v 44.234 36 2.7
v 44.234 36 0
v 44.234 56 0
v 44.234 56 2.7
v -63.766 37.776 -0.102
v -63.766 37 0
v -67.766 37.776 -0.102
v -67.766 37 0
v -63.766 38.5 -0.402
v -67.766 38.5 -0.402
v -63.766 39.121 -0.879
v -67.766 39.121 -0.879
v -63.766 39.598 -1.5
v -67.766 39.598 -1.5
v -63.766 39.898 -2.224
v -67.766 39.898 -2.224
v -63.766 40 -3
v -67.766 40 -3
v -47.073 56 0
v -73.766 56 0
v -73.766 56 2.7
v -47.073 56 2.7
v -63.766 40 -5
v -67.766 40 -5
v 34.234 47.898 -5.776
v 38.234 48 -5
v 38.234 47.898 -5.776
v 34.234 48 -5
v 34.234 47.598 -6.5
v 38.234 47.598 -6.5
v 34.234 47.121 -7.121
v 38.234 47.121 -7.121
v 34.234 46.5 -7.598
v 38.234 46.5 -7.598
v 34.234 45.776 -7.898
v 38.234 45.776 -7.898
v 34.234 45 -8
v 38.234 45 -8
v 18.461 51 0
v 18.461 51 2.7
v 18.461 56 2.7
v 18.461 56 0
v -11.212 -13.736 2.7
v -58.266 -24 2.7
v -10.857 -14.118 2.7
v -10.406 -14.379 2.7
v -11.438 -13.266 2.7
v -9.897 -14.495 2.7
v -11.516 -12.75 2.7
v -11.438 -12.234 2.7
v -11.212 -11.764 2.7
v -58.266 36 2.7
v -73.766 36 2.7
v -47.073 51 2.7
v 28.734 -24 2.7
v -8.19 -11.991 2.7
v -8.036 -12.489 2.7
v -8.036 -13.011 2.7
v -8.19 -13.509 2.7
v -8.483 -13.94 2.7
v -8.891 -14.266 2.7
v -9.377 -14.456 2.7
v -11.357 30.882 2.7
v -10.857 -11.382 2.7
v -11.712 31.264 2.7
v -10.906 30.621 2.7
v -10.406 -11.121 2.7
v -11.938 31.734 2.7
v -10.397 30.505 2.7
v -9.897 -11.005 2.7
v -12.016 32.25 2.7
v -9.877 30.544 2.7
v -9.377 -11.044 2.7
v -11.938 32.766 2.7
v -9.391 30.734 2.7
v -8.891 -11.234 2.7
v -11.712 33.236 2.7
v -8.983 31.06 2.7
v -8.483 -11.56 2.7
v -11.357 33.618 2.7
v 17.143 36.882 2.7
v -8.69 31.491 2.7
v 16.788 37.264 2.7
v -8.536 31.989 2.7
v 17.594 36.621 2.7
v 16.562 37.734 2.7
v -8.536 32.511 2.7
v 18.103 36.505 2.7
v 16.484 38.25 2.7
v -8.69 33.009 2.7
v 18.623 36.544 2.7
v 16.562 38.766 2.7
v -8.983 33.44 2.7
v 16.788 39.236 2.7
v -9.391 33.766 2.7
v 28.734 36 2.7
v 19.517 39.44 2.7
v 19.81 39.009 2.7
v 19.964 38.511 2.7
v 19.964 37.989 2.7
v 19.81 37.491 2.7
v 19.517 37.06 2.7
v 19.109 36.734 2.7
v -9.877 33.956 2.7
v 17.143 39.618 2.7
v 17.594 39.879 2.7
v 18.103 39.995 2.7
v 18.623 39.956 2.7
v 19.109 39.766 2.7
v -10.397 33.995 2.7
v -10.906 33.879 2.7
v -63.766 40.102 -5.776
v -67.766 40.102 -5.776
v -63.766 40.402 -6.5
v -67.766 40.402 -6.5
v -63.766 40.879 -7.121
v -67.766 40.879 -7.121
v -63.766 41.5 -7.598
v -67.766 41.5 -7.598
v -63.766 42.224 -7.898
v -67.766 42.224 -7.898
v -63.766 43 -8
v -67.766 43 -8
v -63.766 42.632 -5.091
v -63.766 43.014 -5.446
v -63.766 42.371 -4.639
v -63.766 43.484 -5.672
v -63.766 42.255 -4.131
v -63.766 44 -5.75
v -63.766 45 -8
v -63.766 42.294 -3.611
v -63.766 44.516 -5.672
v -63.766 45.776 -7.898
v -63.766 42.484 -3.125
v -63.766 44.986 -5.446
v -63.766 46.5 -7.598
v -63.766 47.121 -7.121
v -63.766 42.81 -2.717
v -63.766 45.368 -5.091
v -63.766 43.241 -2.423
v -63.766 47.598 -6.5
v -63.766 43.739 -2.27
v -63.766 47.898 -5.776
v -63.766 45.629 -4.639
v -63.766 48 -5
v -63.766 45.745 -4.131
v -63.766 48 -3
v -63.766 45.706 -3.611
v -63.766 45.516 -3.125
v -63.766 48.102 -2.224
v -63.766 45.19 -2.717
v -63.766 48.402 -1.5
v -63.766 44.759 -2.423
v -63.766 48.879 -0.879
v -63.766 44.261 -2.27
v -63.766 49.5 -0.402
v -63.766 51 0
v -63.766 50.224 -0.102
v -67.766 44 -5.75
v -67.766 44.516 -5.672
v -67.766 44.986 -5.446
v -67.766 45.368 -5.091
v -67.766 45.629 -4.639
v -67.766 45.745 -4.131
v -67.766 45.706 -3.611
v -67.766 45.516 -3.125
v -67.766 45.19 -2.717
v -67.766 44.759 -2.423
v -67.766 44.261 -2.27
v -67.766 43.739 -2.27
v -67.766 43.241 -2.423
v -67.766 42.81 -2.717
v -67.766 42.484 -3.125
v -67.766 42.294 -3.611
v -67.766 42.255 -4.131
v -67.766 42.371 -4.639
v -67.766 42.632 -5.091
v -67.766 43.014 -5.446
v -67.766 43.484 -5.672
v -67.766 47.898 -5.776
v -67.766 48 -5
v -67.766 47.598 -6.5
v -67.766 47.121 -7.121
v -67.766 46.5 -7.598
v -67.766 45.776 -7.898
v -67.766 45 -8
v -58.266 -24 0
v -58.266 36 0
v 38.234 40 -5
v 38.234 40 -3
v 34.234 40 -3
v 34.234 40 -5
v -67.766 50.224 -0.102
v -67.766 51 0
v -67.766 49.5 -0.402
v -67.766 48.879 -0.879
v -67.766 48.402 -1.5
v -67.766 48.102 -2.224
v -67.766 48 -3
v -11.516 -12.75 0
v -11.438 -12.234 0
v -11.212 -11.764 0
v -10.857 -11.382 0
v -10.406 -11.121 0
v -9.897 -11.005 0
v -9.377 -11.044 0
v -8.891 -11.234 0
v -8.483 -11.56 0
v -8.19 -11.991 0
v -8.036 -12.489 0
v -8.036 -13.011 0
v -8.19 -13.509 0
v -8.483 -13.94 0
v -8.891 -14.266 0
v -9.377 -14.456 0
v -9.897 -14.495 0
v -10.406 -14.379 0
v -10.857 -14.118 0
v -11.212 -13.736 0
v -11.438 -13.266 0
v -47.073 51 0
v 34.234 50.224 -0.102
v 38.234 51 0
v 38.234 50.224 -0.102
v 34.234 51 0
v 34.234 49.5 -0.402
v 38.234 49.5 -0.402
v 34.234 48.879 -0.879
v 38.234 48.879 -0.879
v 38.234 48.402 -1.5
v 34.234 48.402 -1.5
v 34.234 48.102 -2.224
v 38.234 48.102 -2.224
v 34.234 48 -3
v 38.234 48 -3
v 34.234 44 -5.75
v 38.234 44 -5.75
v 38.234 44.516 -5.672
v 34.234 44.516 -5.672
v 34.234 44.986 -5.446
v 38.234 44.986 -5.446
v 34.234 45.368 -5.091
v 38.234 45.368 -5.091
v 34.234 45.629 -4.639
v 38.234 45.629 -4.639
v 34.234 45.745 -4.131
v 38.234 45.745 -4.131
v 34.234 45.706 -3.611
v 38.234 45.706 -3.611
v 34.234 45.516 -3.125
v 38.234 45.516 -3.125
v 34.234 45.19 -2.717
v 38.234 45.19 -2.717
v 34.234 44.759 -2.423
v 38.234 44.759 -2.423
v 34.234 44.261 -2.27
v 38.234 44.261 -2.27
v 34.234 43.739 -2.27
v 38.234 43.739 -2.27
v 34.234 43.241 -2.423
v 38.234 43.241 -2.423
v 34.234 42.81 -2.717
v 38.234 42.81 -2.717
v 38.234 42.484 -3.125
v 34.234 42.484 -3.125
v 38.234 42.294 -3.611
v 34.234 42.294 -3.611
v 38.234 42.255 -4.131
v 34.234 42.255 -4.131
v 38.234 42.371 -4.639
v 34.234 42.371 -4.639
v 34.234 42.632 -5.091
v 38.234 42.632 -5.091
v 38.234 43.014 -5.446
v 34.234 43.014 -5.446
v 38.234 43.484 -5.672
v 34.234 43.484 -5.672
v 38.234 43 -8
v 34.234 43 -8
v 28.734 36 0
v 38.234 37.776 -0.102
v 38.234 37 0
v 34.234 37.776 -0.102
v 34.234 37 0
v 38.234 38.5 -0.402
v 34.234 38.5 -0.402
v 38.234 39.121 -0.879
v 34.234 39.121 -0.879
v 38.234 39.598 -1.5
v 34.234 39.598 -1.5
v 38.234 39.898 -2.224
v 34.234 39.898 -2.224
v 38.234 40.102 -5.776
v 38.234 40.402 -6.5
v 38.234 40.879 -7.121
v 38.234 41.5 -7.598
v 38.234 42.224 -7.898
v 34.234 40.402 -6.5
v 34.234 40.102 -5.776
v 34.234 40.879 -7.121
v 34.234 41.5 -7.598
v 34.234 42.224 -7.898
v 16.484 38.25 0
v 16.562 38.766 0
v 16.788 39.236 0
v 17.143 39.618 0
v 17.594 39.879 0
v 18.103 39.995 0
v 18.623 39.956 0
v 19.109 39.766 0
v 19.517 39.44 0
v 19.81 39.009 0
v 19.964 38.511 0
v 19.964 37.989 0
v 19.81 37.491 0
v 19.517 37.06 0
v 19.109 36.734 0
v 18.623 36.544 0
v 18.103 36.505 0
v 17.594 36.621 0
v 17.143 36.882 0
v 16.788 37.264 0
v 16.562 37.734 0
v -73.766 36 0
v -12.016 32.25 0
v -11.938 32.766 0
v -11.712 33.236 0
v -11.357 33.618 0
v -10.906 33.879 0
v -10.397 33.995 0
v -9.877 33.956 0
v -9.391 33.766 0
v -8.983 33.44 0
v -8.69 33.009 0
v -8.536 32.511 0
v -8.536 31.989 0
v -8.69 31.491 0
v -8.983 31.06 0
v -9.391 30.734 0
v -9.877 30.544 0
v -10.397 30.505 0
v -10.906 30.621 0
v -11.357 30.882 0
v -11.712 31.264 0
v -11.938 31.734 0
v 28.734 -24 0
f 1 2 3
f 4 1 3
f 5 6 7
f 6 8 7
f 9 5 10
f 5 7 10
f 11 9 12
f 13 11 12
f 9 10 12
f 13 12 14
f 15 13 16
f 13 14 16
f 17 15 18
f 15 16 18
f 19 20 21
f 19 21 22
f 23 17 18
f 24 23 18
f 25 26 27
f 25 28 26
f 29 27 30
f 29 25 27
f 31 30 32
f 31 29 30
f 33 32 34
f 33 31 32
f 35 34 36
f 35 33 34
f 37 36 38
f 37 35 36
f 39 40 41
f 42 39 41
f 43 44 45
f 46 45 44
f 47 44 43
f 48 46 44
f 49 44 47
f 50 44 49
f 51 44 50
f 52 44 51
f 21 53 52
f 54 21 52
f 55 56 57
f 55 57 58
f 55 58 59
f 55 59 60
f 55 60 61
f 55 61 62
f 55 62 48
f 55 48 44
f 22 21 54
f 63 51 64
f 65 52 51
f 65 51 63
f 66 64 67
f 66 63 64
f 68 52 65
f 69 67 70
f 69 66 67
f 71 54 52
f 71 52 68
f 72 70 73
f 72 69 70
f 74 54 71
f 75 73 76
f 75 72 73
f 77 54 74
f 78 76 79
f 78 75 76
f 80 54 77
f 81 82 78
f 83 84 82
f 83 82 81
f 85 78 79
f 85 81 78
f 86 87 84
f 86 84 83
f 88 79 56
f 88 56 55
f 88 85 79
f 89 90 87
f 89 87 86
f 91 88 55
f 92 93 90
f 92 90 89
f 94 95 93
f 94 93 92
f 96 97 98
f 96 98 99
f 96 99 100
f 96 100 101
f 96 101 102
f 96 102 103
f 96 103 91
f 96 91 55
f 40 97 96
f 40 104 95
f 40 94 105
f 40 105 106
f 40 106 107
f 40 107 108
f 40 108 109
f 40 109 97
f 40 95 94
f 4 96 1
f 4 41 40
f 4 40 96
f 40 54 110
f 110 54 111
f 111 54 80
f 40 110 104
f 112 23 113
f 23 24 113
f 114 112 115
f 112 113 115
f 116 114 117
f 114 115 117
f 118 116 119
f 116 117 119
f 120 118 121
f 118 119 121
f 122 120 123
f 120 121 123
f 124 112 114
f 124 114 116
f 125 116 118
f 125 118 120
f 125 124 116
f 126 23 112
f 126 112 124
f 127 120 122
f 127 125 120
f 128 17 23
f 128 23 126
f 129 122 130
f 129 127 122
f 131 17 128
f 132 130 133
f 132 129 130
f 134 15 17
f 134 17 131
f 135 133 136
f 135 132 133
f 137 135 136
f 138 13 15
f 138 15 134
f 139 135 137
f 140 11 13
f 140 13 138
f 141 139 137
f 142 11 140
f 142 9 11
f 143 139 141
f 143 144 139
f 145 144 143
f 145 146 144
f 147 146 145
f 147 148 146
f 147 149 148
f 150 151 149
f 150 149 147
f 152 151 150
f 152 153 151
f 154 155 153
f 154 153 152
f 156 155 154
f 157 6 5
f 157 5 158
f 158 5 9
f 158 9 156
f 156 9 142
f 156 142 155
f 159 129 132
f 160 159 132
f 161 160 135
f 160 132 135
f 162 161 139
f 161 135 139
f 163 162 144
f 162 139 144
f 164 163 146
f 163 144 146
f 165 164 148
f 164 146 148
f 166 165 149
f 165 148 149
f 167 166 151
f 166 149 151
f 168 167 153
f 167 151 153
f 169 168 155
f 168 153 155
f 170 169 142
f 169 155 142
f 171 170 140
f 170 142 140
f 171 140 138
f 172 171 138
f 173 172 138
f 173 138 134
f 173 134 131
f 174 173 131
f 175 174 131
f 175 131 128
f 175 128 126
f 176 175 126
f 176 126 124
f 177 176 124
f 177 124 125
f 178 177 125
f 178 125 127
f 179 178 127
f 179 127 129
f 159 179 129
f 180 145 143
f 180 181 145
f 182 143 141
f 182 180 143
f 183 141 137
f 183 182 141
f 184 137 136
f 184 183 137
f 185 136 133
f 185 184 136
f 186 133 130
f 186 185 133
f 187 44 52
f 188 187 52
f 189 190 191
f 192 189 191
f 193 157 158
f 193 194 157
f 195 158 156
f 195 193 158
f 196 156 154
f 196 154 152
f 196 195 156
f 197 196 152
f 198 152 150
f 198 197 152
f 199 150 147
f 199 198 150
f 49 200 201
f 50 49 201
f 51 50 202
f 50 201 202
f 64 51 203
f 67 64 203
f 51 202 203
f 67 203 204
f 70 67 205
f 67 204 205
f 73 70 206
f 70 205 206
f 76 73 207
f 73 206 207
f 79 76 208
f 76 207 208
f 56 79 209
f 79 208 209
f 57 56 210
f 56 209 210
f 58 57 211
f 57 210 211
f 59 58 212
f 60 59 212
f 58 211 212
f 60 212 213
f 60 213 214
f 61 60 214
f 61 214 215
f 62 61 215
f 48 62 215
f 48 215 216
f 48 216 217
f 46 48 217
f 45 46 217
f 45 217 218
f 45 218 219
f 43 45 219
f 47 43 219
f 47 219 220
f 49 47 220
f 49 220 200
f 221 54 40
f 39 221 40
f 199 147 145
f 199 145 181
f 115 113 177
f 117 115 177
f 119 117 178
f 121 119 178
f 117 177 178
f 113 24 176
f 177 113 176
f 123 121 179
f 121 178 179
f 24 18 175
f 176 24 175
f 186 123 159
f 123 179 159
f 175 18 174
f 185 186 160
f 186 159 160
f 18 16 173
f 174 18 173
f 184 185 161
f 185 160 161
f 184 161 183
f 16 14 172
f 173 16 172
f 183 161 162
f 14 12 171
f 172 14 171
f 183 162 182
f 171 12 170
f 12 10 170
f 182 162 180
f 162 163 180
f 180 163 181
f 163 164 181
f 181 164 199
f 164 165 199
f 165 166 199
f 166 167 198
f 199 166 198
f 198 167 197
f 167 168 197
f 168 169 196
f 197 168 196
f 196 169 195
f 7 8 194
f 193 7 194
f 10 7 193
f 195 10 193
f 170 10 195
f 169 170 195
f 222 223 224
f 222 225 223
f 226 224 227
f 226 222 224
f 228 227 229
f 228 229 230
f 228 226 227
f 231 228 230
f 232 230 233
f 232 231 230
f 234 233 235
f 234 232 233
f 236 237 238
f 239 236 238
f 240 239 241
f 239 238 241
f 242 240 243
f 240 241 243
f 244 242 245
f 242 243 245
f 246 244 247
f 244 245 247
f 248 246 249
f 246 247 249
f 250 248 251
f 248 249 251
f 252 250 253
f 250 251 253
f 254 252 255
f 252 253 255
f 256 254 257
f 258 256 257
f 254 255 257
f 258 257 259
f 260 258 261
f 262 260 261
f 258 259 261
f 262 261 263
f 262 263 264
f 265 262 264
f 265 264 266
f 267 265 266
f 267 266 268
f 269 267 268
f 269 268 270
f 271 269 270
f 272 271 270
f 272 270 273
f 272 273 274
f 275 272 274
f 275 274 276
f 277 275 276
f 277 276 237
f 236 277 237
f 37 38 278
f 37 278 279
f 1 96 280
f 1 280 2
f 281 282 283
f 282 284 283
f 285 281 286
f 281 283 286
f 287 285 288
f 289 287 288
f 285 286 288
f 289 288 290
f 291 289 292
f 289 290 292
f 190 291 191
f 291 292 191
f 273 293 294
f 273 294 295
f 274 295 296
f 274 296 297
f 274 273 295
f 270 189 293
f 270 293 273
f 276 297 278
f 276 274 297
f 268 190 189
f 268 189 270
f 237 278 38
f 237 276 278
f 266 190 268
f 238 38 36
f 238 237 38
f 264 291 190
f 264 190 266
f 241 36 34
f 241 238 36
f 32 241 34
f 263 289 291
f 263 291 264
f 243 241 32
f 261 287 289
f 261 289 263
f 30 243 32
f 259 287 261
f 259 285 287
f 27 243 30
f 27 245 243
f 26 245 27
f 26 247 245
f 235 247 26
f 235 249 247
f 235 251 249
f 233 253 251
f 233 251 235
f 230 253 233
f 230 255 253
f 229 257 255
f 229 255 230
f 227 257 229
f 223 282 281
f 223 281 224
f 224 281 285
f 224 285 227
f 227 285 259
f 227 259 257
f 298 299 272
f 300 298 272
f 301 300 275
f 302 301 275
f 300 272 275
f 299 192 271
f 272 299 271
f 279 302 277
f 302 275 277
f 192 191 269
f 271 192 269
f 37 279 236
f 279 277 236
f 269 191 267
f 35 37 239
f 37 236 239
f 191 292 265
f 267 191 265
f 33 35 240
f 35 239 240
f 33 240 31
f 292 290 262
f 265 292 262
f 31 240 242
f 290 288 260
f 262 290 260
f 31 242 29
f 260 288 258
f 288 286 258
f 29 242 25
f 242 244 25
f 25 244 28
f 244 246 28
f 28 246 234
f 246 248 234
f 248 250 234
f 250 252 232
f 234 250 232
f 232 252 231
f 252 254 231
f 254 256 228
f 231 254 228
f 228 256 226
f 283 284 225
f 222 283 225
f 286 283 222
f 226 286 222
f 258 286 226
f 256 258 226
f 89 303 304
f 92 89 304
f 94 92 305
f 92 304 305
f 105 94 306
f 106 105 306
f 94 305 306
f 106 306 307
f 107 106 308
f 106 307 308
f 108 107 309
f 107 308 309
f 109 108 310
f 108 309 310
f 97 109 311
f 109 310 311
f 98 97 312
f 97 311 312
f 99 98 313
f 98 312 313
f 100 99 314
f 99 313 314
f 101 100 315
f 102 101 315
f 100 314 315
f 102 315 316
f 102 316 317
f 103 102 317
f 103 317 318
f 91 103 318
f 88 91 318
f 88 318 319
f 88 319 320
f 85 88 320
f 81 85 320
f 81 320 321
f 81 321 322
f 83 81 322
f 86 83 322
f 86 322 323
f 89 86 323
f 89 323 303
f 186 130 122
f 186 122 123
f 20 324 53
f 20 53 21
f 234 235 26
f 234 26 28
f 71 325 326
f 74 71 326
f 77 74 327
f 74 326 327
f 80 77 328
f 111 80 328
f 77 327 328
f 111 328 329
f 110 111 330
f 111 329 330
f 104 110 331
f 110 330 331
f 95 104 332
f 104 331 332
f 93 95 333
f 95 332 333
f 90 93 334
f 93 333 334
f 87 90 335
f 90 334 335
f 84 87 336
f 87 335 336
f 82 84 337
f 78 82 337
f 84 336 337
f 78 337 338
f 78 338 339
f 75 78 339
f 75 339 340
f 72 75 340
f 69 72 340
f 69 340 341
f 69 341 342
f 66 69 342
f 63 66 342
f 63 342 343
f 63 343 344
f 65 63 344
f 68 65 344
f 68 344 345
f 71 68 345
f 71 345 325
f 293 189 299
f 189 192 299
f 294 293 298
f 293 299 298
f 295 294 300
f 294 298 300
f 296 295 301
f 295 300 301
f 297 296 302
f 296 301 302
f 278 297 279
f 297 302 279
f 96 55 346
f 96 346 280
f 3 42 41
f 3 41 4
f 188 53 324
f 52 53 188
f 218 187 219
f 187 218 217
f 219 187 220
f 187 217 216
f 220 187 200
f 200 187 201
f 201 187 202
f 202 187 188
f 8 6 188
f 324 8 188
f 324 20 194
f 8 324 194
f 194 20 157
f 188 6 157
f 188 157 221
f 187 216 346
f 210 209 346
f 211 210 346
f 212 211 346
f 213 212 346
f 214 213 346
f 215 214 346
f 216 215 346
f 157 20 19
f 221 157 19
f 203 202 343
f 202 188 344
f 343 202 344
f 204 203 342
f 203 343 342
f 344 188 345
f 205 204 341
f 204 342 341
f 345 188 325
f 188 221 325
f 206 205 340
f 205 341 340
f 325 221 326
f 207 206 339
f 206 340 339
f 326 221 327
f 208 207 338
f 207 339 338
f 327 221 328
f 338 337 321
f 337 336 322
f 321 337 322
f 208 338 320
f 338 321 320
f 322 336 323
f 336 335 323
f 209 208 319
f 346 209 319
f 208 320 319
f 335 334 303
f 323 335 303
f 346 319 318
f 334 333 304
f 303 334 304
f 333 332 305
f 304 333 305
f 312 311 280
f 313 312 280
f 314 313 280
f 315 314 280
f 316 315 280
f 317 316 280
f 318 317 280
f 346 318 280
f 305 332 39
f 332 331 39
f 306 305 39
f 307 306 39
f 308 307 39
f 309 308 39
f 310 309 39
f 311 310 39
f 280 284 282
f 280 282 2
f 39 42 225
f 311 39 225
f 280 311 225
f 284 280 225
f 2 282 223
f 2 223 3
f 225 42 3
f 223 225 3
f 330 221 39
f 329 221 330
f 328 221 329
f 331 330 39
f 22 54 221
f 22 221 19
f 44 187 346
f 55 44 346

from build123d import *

# Parameters (mm, degrees)
SKETCH1_W           = 118
SKETCH1_H           = 80
BOSS_EXTRUDE1_DEPTH = 2.7
SKETCH3_W           = 5.5
SKETCH3_H           = 60
CUT_EXTRUDE1_DEPTH  = 2.7
SKETCH4_W           = 10
SKETCH4_H           = 60
CUT_EXTRUDE2_DEPTH  = 2.7
SKETCH7_W           = 4
SKETCH7_H           = 8
BOSS_EXTRUDE5_DEPTH = 8
SKETCH8_R           = 1.75
CUT_EXTRUDE4_DEPTH  = 131
FILLET1_R           = 3
SKETCH9_W           = 65.533885403
SKETCH9_H           = 5
CUT_EXTRUDE5_DEPTH  = 53
SKETCH10_R          = 1.75
CUT_EXTRUDE6_DEPTH  = 10


with BuildPart() as part:
    # Sketch1 → Boss-Extrude1 (new body)
    with BuildSketch(Plane.XY):
        with Locations((-14.766233766, 16)):
            Rectangle(SKETCH1_W, SKETCH1_H)
    extrude(amount=BOSS_EXTRUDE1_DEPTH)

    # Sketch3 → Cut-Extrude1 (cut)
    with BuildSketch(Plane.XY.offset(2.7)):
        with Locations((-71.016233766, 6)):
            Rectangle(SKETCH3_W, SKETCH3_H)
        with Locations((41.483766234, 6)):
            Rectangle(SKETCH3_W, SKETCH3_H)
    extrude(amount=-CUT_EXTRUDE1_DEPTH, mode=Mode.SUBTRACT)

    # Sketch4 → Cut-Extrude2 (cut)
    with BuildSketch(Plane.XY.offset(2.7)):
        with Locations((-63.266233766, 6)):
            Rectangle(SKETCH4_W, SKETCH4_H)
        with Locations((33.733766234, 6)):
            Rectangle(SKETCH4_W, SKETCH4_H)
    extrude(amount=-CUT_EXTRUDE2_DEPTH, mode=Mode.SUBTRACT)

    # Sketch7 → Boss-Extrude5 (add)
    with BuildSketch(Plane(origin=(0, 0, 0), x_dir=(-1, 0, 0), z_dir=(0, 0, -1))):
        with Locations((65.766233766, 44)):
            Rectangle(SKETCH7_W, SKETCH7_H)
        with Locations((-36.233766234, 44)):
            Rectangle(SKETCH7_W, SKETCH7_H)
    extrude(amount=BOSS_EXTRUDE5_DEPTH)

    # Sketch8 → Cut-Extrude4 (cut)
    with BuildSketch(Plane(origin=(38.233766234, 0, 0), x_dir=(0, 0, -1), z_dir=(1, 0, 0))):
        with Locations((4, 44)):
            Circle(SKETCH8_R)
    extrude(amount=-CUT_EXTRUDE4_DEPTH, mode=Mode.SUBTRACT)

    # Fillet1
    fillet1_edges = [part.edges().sort_by_distance(p)[0] for p in [
        (-65.766233766, 48, 0),
        (-65.766233766, 40, 0),
        (-65.766233766, 48, -8),
        (-65.766233766, 40, -8),
        (36.233766234, 40, 0),
        (36.233766234, 48, 0),
        (36.233766234, 40, -8),
        (36.233766234, 48, -8),
    ]]
    fillet(fillet1_edges, radius=FILLET1_R)

    # Sketch9 → Cut-Extrude5 (cut)
    with BuildSketch(Plane.XY.offset(2.7)):
        with Locations((-14.306023896, 53.5)):
            Rectangle(SKETCH9_W, SKETCH9_H)
    extrude(amount=-CUT_EXTRUDE5_DEPTH, mode=Mode.SUBTRACT)

    # Sketch10 → Cut-Extrude6 (cut)
    with BuildSketch(Plane(origin=(0, 0, 0), x_dir=(-1, 0, 0), z_dir=(0, 0, -1))):
        with Locations((9.766233766, -12.75)):
            Circle(SKETCH10_R)
        with Locations((10.266233766, 32.25)):
            Circle(SKETCH10_R)
        with Locations((-18.233766234, 38.25)):
            Circle(SKETCH10_R)
    extrude(amount=-CUT_EXTRUDE6_DEPTH, mode=Mode.SUBTRACT)


solid = part.part
